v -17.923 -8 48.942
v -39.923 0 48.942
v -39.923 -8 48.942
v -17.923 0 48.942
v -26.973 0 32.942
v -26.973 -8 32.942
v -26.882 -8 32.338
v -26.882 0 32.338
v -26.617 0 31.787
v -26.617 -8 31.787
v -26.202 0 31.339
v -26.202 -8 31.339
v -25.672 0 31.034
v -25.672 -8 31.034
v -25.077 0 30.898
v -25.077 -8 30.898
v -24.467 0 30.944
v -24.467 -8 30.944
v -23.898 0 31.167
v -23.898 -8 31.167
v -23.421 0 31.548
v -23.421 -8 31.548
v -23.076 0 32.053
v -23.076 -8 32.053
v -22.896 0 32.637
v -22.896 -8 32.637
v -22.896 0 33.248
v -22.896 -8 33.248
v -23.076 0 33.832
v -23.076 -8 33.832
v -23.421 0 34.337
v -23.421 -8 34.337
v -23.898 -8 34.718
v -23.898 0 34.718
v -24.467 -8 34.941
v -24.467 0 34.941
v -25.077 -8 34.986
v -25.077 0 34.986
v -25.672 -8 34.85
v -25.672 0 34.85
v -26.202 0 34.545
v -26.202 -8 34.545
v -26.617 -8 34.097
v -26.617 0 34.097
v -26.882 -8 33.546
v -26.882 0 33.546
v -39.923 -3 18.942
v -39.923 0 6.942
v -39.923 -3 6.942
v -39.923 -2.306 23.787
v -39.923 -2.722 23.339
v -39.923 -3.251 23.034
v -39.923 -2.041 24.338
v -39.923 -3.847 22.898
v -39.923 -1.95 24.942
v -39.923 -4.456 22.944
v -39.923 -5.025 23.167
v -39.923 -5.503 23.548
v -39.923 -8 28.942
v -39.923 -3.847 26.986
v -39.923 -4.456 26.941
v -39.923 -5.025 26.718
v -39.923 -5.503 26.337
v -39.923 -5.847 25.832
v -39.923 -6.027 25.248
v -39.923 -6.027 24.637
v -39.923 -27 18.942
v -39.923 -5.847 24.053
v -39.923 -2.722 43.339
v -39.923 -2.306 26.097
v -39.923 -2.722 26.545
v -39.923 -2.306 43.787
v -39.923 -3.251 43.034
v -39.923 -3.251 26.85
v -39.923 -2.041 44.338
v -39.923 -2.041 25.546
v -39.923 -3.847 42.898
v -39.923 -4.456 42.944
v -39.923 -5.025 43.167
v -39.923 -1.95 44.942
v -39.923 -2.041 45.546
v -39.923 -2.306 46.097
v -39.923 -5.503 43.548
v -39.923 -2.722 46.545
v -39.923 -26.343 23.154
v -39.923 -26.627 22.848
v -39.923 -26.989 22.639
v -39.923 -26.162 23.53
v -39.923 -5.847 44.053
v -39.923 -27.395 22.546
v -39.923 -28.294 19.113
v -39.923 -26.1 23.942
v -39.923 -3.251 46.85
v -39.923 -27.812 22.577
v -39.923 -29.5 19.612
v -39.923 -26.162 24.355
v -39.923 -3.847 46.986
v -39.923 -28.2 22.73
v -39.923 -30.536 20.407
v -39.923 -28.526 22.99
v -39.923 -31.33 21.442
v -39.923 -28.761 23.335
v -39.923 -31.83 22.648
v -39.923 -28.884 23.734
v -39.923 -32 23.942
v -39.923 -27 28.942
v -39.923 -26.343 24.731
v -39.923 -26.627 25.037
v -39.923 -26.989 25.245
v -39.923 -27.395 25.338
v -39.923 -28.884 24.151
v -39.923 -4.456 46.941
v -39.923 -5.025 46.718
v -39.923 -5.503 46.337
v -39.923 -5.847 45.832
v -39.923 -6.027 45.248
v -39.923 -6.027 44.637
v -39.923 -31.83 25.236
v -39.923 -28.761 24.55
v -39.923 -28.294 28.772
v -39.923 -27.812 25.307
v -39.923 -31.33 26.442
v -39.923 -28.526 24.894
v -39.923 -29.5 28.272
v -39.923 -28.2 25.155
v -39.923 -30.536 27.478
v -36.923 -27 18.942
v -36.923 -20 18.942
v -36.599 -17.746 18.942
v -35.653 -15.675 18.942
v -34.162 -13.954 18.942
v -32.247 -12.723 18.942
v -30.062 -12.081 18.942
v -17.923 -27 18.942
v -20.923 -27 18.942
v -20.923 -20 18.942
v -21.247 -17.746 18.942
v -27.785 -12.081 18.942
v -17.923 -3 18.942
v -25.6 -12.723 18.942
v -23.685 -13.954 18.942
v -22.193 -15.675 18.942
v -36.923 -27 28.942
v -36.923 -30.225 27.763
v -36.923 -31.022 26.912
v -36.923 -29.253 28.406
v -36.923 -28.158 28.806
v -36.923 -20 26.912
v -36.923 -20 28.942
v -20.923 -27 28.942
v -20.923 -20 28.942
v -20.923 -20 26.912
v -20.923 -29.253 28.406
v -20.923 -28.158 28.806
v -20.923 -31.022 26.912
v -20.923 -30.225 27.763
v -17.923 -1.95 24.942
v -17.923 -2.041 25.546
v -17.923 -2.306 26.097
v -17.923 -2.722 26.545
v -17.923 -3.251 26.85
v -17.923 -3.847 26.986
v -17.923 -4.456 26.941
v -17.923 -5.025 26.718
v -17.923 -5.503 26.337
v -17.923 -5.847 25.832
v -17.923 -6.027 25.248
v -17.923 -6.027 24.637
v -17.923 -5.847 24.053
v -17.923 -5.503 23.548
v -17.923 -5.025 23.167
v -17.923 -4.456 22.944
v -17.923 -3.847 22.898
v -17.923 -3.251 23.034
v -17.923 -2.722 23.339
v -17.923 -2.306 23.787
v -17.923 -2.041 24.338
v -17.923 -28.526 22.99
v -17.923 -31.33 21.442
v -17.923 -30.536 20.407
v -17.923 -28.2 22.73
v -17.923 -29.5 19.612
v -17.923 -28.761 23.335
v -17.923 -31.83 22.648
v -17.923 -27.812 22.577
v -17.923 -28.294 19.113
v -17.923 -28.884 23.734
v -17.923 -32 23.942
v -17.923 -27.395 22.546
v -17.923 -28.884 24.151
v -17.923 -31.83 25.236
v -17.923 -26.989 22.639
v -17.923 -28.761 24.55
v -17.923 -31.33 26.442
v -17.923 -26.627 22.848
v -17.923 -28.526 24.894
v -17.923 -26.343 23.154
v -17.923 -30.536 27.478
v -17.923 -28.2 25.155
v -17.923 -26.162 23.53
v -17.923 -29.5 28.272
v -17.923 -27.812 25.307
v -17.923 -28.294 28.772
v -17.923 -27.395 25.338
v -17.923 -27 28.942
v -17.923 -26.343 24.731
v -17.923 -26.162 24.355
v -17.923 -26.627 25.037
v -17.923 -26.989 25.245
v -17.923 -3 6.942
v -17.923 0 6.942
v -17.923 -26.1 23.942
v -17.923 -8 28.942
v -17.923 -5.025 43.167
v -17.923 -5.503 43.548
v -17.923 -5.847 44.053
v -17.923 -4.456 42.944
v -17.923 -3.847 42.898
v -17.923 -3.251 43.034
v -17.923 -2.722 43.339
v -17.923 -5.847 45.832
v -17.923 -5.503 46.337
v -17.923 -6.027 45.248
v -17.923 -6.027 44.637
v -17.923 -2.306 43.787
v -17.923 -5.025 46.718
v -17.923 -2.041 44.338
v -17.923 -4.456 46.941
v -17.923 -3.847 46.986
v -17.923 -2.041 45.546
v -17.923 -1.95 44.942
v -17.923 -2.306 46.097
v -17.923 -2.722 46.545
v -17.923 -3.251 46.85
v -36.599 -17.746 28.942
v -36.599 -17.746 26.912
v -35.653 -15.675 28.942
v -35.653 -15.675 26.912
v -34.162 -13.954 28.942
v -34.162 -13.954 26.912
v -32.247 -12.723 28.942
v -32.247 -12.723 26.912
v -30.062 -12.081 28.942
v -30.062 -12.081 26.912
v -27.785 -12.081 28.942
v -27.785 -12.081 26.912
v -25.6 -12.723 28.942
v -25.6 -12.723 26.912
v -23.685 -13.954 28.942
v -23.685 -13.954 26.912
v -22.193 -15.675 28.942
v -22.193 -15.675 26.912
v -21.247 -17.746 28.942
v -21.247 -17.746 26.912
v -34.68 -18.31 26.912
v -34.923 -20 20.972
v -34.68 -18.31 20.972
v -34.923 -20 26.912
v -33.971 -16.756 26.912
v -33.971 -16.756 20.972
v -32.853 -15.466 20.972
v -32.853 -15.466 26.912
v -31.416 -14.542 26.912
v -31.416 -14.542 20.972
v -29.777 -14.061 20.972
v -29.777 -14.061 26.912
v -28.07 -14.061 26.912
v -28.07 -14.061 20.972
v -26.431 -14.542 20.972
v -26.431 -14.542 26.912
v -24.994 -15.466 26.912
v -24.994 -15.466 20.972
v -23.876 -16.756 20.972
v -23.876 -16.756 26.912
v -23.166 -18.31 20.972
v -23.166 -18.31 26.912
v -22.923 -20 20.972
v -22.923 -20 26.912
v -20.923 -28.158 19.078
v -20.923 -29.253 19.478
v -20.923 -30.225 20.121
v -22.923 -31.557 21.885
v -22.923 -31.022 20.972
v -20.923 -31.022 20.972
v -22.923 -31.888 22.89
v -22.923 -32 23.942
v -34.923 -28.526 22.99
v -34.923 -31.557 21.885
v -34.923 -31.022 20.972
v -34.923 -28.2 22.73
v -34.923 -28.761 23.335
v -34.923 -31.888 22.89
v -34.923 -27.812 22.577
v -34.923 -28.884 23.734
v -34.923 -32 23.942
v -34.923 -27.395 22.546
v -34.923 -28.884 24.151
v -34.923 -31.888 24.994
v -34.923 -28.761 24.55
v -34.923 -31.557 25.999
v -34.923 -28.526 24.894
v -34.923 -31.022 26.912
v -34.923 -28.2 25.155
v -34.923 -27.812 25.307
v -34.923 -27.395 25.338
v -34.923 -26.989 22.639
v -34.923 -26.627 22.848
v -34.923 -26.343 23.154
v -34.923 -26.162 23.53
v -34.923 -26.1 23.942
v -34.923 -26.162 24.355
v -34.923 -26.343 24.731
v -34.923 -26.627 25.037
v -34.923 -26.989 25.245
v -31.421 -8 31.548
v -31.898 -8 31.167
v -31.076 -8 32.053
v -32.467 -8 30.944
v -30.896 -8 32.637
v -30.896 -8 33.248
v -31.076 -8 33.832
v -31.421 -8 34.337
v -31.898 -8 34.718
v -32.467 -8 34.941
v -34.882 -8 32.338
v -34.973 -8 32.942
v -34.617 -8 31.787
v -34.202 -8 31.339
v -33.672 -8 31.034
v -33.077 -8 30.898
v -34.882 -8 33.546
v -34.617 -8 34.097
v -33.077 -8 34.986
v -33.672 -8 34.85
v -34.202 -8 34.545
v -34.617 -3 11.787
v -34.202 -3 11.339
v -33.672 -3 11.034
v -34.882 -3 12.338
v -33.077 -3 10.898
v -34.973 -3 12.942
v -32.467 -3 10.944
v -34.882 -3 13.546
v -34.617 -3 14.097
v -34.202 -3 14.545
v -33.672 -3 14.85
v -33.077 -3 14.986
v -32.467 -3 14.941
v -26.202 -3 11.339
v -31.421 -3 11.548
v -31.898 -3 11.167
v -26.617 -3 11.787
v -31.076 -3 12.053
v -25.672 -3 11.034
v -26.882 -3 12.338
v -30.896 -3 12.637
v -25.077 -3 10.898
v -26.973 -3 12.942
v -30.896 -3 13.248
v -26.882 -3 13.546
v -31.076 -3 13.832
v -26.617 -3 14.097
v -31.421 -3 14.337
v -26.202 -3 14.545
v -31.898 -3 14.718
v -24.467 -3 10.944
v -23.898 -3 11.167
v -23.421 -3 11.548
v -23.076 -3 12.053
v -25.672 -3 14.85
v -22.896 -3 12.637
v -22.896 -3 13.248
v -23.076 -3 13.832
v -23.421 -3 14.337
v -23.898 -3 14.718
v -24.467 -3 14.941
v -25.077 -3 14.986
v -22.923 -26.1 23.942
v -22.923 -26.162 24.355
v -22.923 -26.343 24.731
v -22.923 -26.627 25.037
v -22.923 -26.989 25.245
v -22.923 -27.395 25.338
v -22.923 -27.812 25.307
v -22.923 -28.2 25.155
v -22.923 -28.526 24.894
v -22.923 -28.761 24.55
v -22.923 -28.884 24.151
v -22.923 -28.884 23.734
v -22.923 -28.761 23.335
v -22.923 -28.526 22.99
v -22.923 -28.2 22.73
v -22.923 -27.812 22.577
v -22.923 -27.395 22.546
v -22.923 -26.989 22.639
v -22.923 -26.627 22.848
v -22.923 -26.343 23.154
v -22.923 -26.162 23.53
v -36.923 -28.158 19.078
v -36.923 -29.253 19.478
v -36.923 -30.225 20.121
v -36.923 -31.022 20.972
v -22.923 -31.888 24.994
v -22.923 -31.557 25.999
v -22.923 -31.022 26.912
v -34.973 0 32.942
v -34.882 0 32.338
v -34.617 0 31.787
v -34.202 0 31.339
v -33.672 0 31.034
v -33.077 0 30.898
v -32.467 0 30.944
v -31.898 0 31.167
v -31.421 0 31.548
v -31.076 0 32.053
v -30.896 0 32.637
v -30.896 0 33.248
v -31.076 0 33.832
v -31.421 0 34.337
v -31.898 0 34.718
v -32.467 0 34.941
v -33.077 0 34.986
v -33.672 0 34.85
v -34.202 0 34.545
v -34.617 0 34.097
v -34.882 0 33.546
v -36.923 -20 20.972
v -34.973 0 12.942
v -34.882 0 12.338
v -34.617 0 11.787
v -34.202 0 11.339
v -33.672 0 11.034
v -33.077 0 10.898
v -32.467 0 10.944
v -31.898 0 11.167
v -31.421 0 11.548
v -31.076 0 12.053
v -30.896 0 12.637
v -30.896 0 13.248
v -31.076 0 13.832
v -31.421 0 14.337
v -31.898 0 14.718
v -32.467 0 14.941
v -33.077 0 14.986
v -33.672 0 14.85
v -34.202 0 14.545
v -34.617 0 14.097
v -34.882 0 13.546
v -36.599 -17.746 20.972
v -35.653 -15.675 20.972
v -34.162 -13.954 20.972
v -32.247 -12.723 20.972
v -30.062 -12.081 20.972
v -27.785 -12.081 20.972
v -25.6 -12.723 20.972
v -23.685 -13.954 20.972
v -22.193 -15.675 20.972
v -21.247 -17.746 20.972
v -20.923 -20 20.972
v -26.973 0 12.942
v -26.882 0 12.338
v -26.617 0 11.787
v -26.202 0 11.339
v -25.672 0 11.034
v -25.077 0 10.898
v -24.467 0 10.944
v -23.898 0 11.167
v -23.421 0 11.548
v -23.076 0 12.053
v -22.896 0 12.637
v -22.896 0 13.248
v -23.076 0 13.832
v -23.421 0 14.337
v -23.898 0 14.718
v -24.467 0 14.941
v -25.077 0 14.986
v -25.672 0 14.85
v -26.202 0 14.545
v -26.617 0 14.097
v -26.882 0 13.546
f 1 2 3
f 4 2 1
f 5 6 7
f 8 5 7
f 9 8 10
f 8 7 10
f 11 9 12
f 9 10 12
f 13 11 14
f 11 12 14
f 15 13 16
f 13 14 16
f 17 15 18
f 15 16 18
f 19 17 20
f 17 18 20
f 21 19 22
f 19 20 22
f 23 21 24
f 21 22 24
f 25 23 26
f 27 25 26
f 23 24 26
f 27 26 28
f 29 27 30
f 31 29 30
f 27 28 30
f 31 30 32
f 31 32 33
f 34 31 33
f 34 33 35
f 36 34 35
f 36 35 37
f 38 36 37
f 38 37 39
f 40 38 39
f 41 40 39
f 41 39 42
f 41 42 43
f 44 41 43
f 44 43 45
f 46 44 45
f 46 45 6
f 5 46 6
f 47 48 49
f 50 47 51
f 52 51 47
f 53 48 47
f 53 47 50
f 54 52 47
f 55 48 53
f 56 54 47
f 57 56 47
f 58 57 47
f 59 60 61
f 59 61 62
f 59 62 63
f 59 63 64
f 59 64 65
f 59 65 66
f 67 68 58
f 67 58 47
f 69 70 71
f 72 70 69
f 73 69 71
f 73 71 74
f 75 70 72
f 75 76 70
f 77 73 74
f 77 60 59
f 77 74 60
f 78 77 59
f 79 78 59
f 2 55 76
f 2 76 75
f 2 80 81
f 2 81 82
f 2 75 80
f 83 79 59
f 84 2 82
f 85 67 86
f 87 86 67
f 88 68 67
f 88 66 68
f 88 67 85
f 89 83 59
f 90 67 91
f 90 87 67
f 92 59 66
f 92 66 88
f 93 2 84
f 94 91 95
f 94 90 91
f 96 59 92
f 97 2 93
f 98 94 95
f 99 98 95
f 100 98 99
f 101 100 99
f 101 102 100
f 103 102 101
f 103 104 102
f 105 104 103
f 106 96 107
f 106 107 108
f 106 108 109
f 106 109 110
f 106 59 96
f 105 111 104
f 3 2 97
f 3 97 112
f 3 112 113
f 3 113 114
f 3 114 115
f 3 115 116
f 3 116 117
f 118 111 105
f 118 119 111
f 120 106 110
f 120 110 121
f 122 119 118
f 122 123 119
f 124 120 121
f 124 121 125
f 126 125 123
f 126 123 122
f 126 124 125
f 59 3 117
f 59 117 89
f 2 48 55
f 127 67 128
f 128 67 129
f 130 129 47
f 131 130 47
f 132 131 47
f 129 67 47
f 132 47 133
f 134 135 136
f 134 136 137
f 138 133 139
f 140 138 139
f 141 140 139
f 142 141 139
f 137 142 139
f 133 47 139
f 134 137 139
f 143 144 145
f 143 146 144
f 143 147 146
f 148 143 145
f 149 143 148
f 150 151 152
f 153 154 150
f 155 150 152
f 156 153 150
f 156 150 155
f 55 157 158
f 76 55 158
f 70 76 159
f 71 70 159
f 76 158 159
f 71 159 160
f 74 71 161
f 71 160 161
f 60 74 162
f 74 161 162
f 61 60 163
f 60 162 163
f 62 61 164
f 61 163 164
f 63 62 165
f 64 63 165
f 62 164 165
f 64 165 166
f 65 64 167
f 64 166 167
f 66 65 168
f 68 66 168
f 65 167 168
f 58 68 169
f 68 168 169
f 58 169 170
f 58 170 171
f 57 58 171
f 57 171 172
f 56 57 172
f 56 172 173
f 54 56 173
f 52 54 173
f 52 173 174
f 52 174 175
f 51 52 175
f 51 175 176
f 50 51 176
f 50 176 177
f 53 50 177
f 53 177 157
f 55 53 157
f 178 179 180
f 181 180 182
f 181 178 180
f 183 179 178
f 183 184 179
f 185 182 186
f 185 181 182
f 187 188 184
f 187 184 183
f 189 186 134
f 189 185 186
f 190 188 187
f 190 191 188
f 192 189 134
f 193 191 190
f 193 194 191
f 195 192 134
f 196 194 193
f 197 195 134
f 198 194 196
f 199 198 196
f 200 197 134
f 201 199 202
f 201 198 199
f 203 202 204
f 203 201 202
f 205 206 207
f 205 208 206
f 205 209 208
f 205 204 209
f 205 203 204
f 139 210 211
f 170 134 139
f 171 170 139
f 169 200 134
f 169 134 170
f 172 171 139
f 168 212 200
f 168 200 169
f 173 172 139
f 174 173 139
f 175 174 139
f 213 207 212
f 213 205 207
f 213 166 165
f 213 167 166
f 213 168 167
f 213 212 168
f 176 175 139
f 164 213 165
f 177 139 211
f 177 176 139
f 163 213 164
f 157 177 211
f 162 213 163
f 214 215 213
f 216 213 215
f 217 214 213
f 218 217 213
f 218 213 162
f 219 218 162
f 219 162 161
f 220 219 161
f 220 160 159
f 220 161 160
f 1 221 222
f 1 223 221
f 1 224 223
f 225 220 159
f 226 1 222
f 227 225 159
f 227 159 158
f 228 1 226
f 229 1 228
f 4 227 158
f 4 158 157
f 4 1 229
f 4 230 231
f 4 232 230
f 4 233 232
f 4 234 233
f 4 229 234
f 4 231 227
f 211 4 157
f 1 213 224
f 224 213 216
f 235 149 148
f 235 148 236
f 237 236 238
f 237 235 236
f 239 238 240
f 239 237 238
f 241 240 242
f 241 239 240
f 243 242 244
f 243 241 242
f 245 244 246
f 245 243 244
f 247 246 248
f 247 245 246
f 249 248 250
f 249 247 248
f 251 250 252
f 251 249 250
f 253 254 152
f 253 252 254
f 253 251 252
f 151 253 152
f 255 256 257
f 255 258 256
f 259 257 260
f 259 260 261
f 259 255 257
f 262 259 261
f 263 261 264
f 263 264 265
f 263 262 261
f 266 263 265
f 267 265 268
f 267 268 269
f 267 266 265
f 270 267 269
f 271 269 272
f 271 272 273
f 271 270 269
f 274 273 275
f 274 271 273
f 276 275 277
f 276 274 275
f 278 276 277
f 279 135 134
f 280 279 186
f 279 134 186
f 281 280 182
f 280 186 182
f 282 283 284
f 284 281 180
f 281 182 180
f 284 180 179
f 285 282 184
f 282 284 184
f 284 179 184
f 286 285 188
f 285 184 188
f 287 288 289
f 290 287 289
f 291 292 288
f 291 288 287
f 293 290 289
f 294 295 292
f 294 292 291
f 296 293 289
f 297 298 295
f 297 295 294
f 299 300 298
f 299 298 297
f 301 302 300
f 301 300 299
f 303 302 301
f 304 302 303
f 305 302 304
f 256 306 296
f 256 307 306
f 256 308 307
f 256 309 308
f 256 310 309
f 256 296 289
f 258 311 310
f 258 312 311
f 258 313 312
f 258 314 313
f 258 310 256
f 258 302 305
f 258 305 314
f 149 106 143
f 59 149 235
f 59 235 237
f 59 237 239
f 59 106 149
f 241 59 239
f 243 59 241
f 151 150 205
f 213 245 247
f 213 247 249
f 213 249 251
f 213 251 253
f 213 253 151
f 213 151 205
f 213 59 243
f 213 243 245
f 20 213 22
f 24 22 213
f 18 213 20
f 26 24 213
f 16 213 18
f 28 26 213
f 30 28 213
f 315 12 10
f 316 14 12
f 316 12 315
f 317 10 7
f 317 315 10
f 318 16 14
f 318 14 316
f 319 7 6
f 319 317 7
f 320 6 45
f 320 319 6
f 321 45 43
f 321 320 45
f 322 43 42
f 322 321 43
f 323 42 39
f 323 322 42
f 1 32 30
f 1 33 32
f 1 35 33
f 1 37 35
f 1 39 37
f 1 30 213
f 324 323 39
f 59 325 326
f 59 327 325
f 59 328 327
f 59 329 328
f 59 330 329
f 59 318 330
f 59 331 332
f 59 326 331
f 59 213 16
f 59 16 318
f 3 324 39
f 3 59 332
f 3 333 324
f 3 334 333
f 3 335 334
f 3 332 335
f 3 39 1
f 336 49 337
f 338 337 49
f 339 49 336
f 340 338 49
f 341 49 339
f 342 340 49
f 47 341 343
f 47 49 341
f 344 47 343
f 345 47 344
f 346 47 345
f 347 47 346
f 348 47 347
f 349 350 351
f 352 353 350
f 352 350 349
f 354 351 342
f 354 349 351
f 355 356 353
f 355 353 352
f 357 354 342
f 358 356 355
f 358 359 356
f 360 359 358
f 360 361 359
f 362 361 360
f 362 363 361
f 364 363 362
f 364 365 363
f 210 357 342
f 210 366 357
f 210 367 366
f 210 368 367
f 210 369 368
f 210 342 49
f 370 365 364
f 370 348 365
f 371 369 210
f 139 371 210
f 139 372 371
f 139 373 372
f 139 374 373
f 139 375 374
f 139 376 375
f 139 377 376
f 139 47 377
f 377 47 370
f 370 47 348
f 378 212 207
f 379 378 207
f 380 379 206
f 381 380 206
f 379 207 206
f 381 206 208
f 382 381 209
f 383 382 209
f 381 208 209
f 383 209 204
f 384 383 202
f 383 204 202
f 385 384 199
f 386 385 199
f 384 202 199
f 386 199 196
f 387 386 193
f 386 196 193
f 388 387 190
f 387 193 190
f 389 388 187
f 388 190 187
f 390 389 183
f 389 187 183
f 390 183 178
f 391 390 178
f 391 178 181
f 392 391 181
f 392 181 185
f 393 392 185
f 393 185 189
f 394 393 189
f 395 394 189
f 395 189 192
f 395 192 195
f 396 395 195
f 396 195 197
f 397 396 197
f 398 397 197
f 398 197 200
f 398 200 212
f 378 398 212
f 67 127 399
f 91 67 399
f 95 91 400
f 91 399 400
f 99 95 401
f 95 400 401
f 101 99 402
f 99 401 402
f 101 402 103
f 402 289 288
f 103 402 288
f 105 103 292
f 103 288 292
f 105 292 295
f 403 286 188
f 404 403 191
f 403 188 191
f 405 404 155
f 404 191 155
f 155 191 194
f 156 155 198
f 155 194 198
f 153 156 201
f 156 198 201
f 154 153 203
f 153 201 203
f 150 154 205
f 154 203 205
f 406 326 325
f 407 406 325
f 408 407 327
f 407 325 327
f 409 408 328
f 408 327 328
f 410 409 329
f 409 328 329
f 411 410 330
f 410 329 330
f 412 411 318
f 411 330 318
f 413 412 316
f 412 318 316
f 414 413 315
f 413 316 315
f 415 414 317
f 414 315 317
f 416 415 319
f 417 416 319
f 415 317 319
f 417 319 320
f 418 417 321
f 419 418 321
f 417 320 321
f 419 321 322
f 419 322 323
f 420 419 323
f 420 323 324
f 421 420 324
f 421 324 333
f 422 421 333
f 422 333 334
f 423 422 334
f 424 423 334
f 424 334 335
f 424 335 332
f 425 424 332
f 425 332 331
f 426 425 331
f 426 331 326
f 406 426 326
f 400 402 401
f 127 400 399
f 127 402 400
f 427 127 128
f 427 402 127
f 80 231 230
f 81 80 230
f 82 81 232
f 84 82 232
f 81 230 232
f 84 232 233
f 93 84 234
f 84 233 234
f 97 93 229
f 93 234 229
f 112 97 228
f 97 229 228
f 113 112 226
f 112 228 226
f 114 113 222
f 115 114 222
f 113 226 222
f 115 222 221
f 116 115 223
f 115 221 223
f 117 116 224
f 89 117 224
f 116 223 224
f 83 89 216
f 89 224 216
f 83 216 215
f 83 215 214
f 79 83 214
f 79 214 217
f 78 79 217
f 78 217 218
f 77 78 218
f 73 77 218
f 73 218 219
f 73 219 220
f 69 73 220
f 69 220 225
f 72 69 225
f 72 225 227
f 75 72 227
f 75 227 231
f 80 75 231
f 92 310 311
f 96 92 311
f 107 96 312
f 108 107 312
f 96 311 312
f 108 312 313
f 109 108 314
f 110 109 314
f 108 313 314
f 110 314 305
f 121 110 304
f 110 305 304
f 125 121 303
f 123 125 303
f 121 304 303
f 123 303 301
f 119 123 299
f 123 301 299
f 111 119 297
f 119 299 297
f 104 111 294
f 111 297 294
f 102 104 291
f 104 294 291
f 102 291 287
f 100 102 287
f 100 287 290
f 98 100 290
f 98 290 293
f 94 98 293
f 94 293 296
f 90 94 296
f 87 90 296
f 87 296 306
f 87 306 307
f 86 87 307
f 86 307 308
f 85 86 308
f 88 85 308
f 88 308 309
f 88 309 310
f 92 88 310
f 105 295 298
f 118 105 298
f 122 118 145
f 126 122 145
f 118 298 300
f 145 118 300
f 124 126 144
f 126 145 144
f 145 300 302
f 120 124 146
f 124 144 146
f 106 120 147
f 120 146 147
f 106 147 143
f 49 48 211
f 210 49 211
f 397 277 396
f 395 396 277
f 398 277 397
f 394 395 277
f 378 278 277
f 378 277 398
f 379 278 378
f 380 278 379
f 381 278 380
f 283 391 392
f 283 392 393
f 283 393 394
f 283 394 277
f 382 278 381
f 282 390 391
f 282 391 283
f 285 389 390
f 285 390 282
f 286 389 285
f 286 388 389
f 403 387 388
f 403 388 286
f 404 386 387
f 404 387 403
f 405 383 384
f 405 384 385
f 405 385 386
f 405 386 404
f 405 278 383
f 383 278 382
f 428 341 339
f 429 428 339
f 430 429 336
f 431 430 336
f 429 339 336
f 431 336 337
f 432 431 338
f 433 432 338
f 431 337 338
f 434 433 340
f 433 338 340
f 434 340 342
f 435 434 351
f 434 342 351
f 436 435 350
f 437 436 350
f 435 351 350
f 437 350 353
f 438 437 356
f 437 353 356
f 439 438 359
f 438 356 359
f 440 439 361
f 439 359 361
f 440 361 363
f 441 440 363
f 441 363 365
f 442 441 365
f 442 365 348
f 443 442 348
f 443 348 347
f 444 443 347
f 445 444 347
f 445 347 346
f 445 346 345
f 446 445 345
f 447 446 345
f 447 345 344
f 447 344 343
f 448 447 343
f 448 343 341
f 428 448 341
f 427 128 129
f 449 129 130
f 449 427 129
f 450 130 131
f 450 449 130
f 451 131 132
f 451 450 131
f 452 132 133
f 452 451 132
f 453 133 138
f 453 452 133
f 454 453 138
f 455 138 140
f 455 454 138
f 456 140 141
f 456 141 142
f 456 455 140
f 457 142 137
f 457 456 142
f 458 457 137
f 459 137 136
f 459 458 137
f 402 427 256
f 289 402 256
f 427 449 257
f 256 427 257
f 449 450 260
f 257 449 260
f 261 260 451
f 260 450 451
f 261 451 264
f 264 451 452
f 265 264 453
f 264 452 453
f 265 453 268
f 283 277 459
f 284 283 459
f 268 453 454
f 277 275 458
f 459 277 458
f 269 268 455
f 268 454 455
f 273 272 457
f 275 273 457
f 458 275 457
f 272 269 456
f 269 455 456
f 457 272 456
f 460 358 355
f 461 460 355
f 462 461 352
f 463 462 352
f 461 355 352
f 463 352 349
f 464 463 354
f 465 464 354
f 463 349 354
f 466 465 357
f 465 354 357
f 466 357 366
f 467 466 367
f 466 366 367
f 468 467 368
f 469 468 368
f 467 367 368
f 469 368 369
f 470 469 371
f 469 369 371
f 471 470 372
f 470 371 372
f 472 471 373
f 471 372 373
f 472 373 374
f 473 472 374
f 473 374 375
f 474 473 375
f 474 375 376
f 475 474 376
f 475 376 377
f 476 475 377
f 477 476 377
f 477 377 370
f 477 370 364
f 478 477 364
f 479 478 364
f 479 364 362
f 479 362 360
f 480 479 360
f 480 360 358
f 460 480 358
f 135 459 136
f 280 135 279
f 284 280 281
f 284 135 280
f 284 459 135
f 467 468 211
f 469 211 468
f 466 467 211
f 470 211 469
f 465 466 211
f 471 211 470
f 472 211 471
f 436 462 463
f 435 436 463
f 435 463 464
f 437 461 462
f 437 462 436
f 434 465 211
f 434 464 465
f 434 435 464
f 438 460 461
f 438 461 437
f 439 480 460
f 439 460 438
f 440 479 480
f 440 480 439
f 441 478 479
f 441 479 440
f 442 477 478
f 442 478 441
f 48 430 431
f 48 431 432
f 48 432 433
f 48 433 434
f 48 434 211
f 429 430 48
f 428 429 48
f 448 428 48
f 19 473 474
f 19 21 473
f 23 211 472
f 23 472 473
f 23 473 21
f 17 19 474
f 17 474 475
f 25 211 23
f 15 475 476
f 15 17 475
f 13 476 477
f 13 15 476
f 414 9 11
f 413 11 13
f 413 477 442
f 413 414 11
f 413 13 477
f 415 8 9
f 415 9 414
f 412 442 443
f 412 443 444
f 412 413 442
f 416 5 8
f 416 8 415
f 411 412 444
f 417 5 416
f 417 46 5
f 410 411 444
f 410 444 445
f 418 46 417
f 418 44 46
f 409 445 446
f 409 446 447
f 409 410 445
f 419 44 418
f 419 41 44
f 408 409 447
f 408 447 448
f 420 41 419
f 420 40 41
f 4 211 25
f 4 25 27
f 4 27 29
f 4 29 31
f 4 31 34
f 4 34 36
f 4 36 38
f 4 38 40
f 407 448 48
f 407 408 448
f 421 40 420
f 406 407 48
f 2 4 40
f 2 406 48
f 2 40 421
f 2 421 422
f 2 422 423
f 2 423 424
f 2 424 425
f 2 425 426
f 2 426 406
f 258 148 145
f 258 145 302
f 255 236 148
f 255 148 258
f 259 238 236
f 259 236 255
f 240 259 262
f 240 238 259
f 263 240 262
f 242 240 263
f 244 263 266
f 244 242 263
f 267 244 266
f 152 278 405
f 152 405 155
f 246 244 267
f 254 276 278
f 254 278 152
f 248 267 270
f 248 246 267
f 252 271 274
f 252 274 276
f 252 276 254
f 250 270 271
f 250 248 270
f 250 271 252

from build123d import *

# Parameters (mm, degrees)
F0_W     = 22
F0_H     = 42
F1_DEPTH = 3
F2_W     = 3
F2_H     = 30
F2_W_2   = 5
F3_DEPTH = 22
F4_D     = 4.1
F7_DEPTH = 5
F8_DEPTH = 2.97
F9_R     = 4.99999
F11_D    = 4.1
F12_D    = 2.8


# Not quite as in the source:
# - a fillet or chamfer is up to 0.001 mm smaller than in the source, because OpenCascade refuses the exact size


with BuildPart() as f1:
    # F0 (on Front) → F1 (new body)
    with BuildSketch(Plane.XZ):
        with Locations((-28.9233987555, 27.9422005266)):
            Rectangle(F0_W, F0_H)
    extrude(amount=F1_DEPTH)

    # F2 (on face) → F3 (join)
    with BuildSketch(Plane(origin=(-39.9233987555, 0, 0), x_dir=(0, -1, 0), z_dir=(-1, 0, 0))):
        with Locations((1.5, 33.9422005266)):
            Rectangle(F2_W, F2_H)
        with Locations((5.5, 33.9422005266)):
            Rectangle(F2_W_2, F2_H)
    extrude(amount=-F3_DEPTH)

    # F4 (through all)
    with Locations(Plane(origin=(0, 0, 0), x_dir=(1, 0, 0), z_dir=(0, 1, 0))):
        with Locations((-24.9233987555, -12.9422005266), (-32.9233987555, -12.9422005266), (-32.9233987555, -32.9422005266), (-24.9233987555, -32.9422005266)):
            Hole(F4_D / 2)

    # F6 (on line) → F7 (join, symmetric)
    with BuildSketch(Plane.XY.offset(23.9422005266)):
        with BuildLine():
            ThreePointArc((-36.9233987555, -20), (-28.9233987555, -12), (-20.9233987555, -20))
            Line((-20.9233987555, -20), (-20.9233987555, -32))
            Line((-20.9233987555, -32), (-17.9233987555, -32))
            Line((-17.9233987555, -32), (-17.9233987555, 0))
            Line((-17.9233987555, 0), (-39.9233987555, 0))
            Line((-39.9233987555, 0), (-39.9233987555, -32))
            Line((-39.9233987555, -32), (-36.9233987555, -32))
            Line((-36.9233987555, -32), (-36.9233987555, -20))
        make_face()
    extrude(amount=F7_DEPTH, both=True)

    # F6 (on line) → F8 (join, symmetric)
    with BuildSketch(Plane.XY.offset(23.9422005266)):
        with BuildLine():
            ThreePointArc((-34.9233987555, -20), (-28.9233987555, -14), (-22.9233987555, -20))
            Line((-22.9233987555, -20), (-22.9233987555, -25.2915026221))
            ThreePointArc((-22.9233987555, -25.2915026221), (-21.4400839819, -22.8284271247), (-20.9233987555, -20))
            ThreePointArc((-20.9233987555, -20), (-28.9233987555, -12), (-36.9233987555, -20))
            ThreePointArc((-36.9233987555, -20), (-36.406713529, -22.8284271247), (-34.9233987555, -25.2915026221))
            Line((-34.9233987555, -25.2915026221), (-34.9233987555, -20))
        make_face()
        with BuildLine():
            Line((-34.9233987555, -32), (-34.9233987555, -25.2915026221))
            ThreePointArc((-34.9233987555, -25.2915026221), (-36.406713529, -22.8284271247), (-36.9233987555, -20))
            Line((-36.9233987555, -20), (-36.9233987555, -32))
            Line((-36.9233987555, -32), (-34.9233987555, -32))
        make_face()
        with BuildLine():
            ThreePointArc((-20.9233987555, -20), (-21.4400839819, -22.8284271247), (-22.9233987555, -25.2915026221))
            Line((-22.9233987555, -25.2915026221), (-22.9233987555, -32))
            Line((-22.9233987555, -32), (-20.9233987555, -32))
            Line((-20.9233987555, -32), (-20.9233987555, -20))
        make_face()
    extrude(amount=F8_DEPTH, both=True)

    # F9 (radius 5 in the source; OpenCascade refuses exactly that, so slightly less here)
    f9_edges = [f1.edges().sort_by_distance(p)[0] for p in [
        (-38.423399, -32, 28.942201),
        (-38.423399, -32, 18.942201),
        (-19.423399, -32, 18.942201),
        (-19.423399, -32, 28.942201),
    ]]
    fillet(f9_edges, radius=F9_R)

    # F11 (through all)
    with Locations(Plane(origin=(-39.9233987555, 0, 0), x_dir=(0, -1, 0), z_dir=(-1, 0, 0))):
        with Locations((4, 44.9422005266), (4, 24.9422005266)):
            Hole(F11_D / 2)

    # F12 (through all)
    with Locations(Plane(origin=(-39.9233987555, 0, 0), x_dir=(0, -1, 0), z_dir=(-1, 0, 0))):
        with Locations((27.5, 23.9422005266)):
            Hole(F12_D / 2)


solid = f1.part
